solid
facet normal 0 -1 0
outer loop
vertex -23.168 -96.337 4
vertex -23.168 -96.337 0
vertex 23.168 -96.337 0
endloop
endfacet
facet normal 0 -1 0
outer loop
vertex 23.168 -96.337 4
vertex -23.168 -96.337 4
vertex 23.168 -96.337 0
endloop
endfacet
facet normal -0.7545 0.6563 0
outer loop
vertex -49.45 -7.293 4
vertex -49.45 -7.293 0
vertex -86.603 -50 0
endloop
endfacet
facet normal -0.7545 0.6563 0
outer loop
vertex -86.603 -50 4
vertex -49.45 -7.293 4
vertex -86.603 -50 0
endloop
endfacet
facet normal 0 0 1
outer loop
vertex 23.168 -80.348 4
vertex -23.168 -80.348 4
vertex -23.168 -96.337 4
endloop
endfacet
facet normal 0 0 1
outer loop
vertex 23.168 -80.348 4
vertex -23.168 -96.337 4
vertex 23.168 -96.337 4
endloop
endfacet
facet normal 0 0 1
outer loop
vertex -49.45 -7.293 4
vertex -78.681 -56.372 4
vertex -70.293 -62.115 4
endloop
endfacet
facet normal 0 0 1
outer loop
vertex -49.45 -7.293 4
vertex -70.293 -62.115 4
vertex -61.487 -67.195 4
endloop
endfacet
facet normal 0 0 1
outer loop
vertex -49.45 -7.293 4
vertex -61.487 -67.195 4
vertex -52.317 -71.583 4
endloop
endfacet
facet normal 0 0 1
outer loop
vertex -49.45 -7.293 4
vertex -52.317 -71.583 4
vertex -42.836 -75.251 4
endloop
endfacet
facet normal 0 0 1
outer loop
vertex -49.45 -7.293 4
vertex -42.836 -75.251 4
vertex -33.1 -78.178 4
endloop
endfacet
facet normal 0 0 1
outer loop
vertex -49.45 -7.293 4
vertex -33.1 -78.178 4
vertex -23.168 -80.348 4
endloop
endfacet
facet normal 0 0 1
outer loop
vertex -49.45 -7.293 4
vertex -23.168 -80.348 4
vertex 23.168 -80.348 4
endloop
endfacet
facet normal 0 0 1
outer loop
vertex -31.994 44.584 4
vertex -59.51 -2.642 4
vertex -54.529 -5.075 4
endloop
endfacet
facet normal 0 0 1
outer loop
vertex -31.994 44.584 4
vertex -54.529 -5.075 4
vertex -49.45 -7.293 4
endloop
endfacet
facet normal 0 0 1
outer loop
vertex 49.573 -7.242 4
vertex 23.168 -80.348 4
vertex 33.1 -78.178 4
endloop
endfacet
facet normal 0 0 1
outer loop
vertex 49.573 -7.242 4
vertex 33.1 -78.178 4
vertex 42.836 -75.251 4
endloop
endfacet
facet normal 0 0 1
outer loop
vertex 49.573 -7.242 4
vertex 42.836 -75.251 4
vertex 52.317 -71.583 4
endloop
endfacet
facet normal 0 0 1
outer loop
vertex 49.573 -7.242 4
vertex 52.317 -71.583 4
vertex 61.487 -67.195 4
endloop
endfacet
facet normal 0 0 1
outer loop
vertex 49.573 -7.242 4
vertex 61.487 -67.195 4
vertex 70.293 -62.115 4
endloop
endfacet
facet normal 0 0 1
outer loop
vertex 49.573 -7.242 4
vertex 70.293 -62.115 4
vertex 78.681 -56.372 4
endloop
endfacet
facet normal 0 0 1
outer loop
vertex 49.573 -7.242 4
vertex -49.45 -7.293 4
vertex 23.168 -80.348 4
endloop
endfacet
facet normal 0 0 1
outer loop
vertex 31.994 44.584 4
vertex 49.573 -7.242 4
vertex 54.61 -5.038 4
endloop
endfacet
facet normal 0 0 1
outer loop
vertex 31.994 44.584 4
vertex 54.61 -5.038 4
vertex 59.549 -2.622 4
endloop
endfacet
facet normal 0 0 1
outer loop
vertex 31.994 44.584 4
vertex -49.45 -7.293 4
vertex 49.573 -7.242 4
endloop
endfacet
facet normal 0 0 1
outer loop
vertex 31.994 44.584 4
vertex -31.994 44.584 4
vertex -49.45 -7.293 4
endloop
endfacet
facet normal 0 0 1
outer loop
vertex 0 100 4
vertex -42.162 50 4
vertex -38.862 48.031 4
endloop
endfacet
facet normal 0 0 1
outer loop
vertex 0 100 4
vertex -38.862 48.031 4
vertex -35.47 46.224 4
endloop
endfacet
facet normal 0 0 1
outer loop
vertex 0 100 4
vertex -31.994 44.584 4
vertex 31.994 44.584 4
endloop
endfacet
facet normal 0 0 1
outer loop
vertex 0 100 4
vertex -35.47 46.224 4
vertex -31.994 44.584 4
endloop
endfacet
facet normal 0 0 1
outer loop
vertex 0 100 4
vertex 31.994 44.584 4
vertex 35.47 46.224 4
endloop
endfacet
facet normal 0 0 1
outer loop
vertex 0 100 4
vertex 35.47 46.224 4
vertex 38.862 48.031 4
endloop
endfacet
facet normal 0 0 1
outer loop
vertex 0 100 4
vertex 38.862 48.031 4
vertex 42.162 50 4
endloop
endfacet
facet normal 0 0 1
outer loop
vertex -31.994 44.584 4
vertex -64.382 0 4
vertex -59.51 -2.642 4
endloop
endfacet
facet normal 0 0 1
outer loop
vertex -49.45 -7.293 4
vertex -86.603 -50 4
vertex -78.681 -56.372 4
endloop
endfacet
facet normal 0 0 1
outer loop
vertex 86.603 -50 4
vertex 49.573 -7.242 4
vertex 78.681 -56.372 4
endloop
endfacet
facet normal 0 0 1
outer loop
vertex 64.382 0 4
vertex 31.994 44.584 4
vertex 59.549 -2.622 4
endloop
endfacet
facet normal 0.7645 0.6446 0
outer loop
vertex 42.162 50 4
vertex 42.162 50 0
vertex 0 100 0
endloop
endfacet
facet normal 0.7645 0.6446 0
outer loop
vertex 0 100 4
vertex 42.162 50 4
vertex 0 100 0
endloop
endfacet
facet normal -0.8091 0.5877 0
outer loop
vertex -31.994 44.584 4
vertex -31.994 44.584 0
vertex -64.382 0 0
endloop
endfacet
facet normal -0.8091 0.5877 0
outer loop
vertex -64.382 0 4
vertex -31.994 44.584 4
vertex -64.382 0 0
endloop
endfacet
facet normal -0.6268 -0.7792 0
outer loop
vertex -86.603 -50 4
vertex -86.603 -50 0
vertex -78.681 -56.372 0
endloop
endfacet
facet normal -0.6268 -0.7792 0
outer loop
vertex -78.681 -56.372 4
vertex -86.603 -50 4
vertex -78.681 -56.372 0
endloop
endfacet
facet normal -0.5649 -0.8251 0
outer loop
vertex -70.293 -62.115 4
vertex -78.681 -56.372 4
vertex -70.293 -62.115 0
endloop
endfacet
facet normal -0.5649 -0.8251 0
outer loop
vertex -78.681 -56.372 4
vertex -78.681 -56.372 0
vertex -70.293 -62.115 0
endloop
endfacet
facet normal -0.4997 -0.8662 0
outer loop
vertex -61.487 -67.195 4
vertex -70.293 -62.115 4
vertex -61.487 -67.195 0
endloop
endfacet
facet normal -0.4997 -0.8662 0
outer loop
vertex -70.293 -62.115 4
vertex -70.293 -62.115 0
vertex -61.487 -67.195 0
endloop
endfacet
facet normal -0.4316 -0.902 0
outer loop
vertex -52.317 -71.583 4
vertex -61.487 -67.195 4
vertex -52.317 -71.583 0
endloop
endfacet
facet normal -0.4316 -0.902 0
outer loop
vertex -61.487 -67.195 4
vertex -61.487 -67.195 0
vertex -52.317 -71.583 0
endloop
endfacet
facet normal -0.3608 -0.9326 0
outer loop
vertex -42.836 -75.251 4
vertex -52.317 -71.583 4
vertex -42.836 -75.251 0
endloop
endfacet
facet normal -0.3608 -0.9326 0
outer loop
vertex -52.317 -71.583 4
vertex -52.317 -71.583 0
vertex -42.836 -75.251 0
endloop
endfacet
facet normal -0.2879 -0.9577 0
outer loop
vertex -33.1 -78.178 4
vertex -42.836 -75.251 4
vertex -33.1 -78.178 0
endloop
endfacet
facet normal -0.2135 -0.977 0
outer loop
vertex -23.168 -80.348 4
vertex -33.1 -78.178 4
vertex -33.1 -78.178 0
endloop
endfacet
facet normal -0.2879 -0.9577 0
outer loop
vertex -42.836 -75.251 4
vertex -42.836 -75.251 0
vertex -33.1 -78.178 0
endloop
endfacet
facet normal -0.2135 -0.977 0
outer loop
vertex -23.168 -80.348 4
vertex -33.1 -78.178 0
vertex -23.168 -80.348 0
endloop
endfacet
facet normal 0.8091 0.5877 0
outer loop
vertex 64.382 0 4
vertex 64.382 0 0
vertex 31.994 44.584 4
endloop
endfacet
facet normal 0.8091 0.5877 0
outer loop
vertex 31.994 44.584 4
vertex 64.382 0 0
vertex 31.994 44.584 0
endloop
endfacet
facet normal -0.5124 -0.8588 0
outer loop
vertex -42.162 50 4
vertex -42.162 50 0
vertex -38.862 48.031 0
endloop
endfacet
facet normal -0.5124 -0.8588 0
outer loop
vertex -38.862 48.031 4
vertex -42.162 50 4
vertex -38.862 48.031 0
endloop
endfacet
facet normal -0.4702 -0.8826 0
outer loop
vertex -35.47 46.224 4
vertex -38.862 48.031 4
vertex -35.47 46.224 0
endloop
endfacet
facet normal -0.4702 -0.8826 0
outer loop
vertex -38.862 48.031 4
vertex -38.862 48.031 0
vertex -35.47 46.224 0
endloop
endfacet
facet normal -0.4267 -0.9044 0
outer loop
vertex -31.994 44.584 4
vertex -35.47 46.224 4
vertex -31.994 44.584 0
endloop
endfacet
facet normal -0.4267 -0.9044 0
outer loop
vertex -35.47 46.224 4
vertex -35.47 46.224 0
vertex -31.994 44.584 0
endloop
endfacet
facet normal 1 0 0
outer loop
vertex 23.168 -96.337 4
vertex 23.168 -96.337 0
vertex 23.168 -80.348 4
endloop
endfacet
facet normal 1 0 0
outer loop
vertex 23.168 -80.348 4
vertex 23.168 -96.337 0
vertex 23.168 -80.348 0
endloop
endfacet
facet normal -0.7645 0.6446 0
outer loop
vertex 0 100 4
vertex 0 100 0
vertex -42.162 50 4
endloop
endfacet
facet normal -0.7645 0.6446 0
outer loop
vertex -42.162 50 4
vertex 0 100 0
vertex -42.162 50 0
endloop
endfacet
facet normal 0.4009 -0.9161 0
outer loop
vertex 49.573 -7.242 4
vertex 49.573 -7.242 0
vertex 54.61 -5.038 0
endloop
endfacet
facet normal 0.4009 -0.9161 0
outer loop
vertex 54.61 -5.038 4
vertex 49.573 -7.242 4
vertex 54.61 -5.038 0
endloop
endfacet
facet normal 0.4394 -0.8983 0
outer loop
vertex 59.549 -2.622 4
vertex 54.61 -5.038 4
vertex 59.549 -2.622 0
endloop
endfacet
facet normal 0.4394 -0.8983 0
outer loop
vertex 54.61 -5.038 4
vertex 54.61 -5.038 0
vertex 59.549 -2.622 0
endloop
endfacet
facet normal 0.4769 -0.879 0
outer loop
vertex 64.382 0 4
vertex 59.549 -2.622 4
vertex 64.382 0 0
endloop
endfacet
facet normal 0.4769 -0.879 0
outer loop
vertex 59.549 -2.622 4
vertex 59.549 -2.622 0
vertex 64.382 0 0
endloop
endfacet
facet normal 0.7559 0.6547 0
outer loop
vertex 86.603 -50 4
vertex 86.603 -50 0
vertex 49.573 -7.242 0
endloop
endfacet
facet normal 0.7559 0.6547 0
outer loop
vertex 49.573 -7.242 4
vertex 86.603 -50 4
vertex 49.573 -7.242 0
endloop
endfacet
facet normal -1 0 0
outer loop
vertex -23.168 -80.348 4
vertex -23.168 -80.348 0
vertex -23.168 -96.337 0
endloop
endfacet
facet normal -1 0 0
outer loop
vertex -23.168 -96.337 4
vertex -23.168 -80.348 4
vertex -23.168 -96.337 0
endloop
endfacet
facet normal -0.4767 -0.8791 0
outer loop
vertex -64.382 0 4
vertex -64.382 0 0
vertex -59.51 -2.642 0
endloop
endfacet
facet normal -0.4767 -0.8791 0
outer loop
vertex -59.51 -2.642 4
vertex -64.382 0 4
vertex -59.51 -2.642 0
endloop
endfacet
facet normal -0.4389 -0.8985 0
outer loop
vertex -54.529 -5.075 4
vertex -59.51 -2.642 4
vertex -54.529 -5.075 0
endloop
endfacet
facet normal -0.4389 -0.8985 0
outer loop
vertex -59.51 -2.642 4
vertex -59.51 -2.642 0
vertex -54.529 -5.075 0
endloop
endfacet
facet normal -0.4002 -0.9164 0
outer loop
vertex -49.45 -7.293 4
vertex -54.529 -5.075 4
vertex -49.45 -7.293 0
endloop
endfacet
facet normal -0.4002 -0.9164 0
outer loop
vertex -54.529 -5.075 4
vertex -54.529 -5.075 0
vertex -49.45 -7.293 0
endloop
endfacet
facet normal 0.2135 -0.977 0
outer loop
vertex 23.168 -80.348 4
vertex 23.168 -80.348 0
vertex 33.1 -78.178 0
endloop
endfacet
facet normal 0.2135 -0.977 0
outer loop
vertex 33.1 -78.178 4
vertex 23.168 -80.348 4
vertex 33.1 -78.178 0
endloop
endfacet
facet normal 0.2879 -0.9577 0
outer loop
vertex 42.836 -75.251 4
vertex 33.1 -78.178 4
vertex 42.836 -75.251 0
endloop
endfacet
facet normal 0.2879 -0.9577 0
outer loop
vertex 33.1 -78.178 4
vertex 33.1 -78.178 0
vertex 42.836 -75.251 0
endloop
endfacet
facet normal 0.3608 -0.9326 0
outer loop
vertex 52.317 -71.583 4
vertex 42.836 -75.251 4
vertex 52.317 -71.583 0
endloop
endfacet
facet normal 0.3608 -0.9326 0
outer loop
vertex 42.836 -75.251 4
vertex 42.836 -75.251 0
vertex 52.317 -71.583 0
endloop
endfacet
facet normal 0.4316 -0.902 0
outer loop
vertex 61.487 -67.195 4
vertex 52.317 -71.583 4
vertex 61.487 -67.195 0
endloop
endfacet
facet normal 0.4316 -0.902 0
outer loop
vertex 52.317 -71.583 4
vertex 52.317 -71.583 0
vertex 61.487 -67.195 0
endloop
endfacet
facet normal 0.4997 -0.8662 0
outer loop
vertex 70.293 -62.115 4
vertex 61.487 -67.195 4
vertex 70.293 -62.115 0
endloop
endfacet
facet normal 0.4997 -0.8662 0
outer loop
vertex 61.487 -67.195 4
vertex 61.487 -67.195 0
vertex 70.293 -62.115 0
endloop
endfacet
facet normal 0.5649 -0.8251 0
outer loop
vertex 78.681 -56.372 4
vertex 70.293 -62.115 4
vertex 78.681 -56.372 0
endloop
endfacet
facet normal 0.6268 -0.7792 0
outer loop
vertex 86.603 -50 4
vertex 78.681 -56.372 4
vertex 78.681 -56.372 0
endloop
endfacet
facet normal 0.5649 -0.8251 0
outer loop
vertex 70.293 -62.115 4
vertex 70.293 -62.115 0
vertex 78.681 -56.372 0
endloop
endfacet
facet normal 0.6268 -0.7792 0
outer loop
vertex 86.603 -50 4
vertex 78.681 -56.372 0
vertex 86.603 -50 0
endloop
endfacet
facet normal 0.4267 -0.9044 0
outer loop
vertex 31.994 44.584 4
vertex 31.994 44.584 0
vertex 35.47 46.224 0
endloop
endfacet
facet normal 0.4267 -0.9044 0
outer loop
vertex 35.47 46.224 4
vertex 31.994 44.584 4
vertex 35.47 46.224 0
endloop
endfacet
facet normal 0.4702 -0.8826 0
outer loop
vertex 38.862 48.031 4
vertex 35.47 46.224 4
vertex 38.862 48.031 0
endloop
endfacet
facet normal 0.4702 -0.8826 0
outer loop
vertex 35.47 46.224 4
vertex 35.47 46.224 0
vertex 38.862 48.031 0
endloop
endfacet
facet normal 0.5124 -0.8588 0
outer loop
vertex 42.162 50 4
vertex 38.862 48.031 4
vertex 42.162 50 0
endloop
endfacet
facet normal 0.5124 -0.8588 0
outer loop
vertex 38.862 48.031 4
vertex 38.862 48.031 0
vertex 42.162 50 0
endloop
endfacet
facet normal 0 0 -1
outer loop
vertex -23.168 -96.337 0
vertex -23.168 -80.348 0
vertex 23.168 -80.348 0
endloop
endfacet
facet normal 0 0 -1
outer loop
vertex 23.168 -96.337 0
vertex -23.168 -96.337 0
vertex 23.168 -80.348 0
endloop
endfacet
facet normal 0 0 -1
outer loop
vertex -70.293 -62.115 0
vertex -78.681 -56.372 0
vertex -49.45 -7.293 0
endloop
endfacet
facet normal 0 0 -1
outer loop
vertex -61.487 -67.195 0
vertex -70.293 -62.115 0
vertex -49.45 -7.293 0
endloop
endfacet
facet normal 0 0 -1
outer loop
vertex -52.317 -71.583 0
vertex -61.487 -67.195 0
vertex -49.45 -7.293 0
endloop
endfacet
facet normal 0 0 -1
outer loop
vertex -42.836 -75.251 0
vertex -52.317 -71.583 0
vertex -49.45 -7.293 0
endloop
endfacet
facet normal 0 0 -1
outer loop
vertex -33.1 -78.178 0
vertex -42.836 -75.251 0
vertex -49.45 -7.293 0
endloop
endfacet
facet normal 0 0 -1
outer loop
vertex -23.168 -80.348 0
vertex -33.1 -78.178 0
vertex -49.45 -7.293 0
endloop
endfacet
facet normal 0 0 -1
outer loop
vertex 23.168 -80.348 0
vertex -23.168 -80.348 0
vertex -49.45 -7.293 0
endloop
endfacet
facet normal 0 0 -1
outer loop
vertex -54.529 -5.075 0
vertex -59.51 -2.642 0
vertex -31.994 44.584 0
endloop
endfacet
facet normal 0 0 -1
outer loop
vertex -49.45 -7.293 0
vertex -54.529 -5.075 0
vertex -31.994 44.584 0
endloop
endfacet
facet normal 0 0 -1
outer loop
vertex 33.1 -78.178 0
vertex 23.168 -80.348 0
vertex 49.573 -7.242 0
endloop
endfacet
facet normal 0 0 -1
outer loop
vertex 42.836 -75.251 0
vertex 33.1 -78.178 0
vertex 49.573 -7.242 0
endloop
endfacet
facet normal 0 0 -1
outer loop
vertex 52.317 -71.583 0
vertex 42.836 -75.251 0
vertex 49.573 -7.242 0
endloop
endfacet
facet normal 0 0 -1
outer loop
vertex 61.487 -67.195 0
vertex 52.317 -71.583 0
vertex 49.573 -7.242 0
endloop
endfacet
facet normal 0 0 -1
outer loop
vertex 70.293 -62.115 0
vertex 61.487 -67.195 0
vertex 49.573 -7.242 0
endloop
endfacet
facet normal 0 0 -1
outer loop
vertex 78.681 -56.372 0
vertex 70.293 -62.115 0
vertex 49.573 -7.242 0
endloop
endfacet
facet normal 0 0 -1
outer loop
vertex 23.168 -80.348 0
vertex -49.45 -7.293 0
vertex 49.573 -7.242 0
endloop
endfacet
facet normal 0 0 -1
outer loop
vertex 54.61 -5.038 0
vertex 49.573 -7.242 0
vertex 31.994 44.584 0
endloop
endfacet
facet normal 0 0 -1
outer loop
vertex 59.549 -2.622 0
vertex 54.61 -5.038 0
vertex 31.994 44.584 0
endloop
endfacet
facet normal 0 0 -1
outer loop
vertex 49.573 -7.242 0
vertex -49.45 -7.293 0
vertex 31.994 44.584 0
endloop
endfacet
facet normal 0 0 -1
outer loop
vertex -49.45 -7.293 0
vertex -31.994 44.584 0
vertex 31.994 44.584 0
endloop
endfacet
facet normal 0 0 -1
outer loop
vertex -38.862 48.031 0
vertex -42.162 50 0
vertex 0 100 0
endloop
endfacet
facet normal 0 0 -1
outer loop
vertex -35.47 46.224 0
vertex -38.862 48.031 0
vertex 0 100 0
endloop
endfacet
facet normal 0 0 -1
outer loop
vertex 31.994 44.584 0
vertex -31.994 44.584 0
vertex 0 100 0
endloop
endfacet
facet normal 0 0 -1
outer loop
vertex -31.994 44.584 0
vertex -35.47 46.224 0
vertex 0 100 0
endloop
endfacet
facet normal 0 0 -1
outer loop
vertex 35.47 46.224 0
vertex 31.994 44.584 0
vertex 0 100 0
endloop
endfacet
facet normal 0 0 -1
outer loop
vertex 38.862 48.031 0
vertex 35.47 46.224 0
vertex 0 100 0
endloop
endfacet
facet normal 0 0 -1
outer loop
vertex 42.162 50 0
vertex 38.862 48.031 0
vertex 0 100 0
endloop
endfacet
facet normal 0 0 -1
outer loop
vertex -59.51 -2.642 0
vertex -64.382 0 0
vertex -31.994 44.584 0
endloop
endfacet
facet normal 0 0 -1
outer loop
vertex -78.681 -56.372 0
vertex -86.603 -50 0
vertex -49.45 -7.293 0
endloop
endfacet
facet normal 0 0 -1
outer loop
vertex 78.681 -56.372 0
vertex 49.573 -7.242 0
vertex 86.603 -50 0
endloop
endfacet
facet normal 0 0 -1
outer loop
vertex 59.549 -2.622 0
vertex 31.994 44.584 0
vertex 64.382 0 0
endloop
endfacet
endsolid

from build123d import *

# Parameters (mm, degrees)
F1_DEPTH = 4


with BuildPart() as f1:
    # F0 (on Top) → F1 (new body)
    with BuildSketch(Plane.XY):
        with BuildLine():
            Line((0, 100), (-42.1617882956, 50))
            ThreePointArc((-42.1617882956, 50), (-37.1768676119, 47.106612997), (-31.994432446, 44.5840174441))
            ThreePointArc((-31.994432446, 44.5840174441), (-21.0663934766, 40.6801499068), (-9.6846764242, 38.4176878845))
            ThreePointArc((-9.6846764242, 38.4176878845), (0.15722732, 37.8225468215), (9.9966866024, 38.4568205982))
            ThreePointArc((9.9966866024, 38.4568205982), (21.2178970455, 40.7221870715), (31.994432446, 44.5840174441))
            ThreePointArc((31.994432446, 44.5840174441), (37.1768676119, 47.106612997), (42.1617882956, 50))
            Line((42.1617882956, 50), (0, 100))
        make_face()
        with BuildLine():
            ThreePointArc((-9.6846764242, 38.4176878845), (-21.0663934766, 40.6801499068), (-31.994432446, 44.5840174441))
            Line((-31.994432446, 44.5840174441), (-64.382164337, 0))
            ThreePointArc((-64.382164337, 0), (-57.0326259859, -3.8851908994), (-49.4497308534, -7.2925540604))
            Line((-49.4497308534, -7.2925540604), (-9.6846764242, 38.4176878845))
        make_face()
        with BuildLine():
            ThreePointArc((9.9966866024, 38.4568205982), (0.15722732, 37.8225468215), (-9.6846764242, 38.4176878845))
            Line((-9.6846764242, 38.4176878845), (-49.4497308534, -7.2925540604))
            ThreePointArc((-49.4497308534, -7.2925540604), (0.0665901335, -17.0676588152), (49.5728681141, -7.2418175004))
            Line((49.5728681141, -7.2418175004), (9.9966866024, 38.4568205982))
        make_face()
        with BuildLine():
            ThreePointArc((31.994432446, 44.5840174441), (21.2178970455, 40.7221870715), (9.9966866024, 38.4568205982))
            Line((9.9966866024, 38.4568205982), (49.5728681141, -7.2418175004))
            ThreePointArc((49.5728681141, -7.2418175004), (57.0924542774, -3.8559535654), (64.382164337, 0))
            Line((64.382164337, 0), (31.994432446, 44.5840174441))
        make_face()
        with BuildLine():
            ThreePointArc((49.5728681141, -7.2418175004), (0.0665901335, -17.0676588152), (-49.4497308534, -7.2925540604))
            Line((-49.4497308534, -7.2925540604), (-86.6025403784, -50))
            ThreePointArc((-86.6025403784, -50), (-56.9443850461, -69.4774247767), (-23.1684497457, -80.347679982))
            Line((-23.1684497457, -80.347679982), (-23.1684497457, -50))
            Line((-23.1684497457, -50), (23.1684497457, -50))
            Line((23.1684497457, -50), (23.1684497457, -80.347679982))
            ThreePointArc((23.1684497457, -80.347679982), (56.9443850461, -69.4774247767), (86.6025403784, -50))
            Line((86.6025403784, -50), (49.5728681141, -7.2418175004))
        make_face()
        with BuildLine():
            Line((-23.1684497457, -50), (-23.1684497457, -80.347679982))
            ThreePointArc((-23.1684497457, -80.347679982), (0, -82.3976528812), (23.1684497457, -80.347679982))
            Line((23.1684497457, -80.347679982), (23.1684497457, -50))
            Line((23.1684497457, -50), (-23.1684497457, -50))
        make_face()
        with BuildLine():
            ThreePointArc((23.1684497457, -80.347679982), (0, -82.3976528812), (-23.1684497457, -80.347679982))
            Line((-23.1684497457, -80.347679982), (-23.1684497457, -96.3368994915))
            Line((-23.1684497457, -96.3368994915), (23.1684497457, -96.3368994915))
            Line((23.1684497457, -96.3368994915), (23.1684497457, -80.347679982))
        make_face()
    extrude(amount=F1_DEPTH)


solid = f1.part
